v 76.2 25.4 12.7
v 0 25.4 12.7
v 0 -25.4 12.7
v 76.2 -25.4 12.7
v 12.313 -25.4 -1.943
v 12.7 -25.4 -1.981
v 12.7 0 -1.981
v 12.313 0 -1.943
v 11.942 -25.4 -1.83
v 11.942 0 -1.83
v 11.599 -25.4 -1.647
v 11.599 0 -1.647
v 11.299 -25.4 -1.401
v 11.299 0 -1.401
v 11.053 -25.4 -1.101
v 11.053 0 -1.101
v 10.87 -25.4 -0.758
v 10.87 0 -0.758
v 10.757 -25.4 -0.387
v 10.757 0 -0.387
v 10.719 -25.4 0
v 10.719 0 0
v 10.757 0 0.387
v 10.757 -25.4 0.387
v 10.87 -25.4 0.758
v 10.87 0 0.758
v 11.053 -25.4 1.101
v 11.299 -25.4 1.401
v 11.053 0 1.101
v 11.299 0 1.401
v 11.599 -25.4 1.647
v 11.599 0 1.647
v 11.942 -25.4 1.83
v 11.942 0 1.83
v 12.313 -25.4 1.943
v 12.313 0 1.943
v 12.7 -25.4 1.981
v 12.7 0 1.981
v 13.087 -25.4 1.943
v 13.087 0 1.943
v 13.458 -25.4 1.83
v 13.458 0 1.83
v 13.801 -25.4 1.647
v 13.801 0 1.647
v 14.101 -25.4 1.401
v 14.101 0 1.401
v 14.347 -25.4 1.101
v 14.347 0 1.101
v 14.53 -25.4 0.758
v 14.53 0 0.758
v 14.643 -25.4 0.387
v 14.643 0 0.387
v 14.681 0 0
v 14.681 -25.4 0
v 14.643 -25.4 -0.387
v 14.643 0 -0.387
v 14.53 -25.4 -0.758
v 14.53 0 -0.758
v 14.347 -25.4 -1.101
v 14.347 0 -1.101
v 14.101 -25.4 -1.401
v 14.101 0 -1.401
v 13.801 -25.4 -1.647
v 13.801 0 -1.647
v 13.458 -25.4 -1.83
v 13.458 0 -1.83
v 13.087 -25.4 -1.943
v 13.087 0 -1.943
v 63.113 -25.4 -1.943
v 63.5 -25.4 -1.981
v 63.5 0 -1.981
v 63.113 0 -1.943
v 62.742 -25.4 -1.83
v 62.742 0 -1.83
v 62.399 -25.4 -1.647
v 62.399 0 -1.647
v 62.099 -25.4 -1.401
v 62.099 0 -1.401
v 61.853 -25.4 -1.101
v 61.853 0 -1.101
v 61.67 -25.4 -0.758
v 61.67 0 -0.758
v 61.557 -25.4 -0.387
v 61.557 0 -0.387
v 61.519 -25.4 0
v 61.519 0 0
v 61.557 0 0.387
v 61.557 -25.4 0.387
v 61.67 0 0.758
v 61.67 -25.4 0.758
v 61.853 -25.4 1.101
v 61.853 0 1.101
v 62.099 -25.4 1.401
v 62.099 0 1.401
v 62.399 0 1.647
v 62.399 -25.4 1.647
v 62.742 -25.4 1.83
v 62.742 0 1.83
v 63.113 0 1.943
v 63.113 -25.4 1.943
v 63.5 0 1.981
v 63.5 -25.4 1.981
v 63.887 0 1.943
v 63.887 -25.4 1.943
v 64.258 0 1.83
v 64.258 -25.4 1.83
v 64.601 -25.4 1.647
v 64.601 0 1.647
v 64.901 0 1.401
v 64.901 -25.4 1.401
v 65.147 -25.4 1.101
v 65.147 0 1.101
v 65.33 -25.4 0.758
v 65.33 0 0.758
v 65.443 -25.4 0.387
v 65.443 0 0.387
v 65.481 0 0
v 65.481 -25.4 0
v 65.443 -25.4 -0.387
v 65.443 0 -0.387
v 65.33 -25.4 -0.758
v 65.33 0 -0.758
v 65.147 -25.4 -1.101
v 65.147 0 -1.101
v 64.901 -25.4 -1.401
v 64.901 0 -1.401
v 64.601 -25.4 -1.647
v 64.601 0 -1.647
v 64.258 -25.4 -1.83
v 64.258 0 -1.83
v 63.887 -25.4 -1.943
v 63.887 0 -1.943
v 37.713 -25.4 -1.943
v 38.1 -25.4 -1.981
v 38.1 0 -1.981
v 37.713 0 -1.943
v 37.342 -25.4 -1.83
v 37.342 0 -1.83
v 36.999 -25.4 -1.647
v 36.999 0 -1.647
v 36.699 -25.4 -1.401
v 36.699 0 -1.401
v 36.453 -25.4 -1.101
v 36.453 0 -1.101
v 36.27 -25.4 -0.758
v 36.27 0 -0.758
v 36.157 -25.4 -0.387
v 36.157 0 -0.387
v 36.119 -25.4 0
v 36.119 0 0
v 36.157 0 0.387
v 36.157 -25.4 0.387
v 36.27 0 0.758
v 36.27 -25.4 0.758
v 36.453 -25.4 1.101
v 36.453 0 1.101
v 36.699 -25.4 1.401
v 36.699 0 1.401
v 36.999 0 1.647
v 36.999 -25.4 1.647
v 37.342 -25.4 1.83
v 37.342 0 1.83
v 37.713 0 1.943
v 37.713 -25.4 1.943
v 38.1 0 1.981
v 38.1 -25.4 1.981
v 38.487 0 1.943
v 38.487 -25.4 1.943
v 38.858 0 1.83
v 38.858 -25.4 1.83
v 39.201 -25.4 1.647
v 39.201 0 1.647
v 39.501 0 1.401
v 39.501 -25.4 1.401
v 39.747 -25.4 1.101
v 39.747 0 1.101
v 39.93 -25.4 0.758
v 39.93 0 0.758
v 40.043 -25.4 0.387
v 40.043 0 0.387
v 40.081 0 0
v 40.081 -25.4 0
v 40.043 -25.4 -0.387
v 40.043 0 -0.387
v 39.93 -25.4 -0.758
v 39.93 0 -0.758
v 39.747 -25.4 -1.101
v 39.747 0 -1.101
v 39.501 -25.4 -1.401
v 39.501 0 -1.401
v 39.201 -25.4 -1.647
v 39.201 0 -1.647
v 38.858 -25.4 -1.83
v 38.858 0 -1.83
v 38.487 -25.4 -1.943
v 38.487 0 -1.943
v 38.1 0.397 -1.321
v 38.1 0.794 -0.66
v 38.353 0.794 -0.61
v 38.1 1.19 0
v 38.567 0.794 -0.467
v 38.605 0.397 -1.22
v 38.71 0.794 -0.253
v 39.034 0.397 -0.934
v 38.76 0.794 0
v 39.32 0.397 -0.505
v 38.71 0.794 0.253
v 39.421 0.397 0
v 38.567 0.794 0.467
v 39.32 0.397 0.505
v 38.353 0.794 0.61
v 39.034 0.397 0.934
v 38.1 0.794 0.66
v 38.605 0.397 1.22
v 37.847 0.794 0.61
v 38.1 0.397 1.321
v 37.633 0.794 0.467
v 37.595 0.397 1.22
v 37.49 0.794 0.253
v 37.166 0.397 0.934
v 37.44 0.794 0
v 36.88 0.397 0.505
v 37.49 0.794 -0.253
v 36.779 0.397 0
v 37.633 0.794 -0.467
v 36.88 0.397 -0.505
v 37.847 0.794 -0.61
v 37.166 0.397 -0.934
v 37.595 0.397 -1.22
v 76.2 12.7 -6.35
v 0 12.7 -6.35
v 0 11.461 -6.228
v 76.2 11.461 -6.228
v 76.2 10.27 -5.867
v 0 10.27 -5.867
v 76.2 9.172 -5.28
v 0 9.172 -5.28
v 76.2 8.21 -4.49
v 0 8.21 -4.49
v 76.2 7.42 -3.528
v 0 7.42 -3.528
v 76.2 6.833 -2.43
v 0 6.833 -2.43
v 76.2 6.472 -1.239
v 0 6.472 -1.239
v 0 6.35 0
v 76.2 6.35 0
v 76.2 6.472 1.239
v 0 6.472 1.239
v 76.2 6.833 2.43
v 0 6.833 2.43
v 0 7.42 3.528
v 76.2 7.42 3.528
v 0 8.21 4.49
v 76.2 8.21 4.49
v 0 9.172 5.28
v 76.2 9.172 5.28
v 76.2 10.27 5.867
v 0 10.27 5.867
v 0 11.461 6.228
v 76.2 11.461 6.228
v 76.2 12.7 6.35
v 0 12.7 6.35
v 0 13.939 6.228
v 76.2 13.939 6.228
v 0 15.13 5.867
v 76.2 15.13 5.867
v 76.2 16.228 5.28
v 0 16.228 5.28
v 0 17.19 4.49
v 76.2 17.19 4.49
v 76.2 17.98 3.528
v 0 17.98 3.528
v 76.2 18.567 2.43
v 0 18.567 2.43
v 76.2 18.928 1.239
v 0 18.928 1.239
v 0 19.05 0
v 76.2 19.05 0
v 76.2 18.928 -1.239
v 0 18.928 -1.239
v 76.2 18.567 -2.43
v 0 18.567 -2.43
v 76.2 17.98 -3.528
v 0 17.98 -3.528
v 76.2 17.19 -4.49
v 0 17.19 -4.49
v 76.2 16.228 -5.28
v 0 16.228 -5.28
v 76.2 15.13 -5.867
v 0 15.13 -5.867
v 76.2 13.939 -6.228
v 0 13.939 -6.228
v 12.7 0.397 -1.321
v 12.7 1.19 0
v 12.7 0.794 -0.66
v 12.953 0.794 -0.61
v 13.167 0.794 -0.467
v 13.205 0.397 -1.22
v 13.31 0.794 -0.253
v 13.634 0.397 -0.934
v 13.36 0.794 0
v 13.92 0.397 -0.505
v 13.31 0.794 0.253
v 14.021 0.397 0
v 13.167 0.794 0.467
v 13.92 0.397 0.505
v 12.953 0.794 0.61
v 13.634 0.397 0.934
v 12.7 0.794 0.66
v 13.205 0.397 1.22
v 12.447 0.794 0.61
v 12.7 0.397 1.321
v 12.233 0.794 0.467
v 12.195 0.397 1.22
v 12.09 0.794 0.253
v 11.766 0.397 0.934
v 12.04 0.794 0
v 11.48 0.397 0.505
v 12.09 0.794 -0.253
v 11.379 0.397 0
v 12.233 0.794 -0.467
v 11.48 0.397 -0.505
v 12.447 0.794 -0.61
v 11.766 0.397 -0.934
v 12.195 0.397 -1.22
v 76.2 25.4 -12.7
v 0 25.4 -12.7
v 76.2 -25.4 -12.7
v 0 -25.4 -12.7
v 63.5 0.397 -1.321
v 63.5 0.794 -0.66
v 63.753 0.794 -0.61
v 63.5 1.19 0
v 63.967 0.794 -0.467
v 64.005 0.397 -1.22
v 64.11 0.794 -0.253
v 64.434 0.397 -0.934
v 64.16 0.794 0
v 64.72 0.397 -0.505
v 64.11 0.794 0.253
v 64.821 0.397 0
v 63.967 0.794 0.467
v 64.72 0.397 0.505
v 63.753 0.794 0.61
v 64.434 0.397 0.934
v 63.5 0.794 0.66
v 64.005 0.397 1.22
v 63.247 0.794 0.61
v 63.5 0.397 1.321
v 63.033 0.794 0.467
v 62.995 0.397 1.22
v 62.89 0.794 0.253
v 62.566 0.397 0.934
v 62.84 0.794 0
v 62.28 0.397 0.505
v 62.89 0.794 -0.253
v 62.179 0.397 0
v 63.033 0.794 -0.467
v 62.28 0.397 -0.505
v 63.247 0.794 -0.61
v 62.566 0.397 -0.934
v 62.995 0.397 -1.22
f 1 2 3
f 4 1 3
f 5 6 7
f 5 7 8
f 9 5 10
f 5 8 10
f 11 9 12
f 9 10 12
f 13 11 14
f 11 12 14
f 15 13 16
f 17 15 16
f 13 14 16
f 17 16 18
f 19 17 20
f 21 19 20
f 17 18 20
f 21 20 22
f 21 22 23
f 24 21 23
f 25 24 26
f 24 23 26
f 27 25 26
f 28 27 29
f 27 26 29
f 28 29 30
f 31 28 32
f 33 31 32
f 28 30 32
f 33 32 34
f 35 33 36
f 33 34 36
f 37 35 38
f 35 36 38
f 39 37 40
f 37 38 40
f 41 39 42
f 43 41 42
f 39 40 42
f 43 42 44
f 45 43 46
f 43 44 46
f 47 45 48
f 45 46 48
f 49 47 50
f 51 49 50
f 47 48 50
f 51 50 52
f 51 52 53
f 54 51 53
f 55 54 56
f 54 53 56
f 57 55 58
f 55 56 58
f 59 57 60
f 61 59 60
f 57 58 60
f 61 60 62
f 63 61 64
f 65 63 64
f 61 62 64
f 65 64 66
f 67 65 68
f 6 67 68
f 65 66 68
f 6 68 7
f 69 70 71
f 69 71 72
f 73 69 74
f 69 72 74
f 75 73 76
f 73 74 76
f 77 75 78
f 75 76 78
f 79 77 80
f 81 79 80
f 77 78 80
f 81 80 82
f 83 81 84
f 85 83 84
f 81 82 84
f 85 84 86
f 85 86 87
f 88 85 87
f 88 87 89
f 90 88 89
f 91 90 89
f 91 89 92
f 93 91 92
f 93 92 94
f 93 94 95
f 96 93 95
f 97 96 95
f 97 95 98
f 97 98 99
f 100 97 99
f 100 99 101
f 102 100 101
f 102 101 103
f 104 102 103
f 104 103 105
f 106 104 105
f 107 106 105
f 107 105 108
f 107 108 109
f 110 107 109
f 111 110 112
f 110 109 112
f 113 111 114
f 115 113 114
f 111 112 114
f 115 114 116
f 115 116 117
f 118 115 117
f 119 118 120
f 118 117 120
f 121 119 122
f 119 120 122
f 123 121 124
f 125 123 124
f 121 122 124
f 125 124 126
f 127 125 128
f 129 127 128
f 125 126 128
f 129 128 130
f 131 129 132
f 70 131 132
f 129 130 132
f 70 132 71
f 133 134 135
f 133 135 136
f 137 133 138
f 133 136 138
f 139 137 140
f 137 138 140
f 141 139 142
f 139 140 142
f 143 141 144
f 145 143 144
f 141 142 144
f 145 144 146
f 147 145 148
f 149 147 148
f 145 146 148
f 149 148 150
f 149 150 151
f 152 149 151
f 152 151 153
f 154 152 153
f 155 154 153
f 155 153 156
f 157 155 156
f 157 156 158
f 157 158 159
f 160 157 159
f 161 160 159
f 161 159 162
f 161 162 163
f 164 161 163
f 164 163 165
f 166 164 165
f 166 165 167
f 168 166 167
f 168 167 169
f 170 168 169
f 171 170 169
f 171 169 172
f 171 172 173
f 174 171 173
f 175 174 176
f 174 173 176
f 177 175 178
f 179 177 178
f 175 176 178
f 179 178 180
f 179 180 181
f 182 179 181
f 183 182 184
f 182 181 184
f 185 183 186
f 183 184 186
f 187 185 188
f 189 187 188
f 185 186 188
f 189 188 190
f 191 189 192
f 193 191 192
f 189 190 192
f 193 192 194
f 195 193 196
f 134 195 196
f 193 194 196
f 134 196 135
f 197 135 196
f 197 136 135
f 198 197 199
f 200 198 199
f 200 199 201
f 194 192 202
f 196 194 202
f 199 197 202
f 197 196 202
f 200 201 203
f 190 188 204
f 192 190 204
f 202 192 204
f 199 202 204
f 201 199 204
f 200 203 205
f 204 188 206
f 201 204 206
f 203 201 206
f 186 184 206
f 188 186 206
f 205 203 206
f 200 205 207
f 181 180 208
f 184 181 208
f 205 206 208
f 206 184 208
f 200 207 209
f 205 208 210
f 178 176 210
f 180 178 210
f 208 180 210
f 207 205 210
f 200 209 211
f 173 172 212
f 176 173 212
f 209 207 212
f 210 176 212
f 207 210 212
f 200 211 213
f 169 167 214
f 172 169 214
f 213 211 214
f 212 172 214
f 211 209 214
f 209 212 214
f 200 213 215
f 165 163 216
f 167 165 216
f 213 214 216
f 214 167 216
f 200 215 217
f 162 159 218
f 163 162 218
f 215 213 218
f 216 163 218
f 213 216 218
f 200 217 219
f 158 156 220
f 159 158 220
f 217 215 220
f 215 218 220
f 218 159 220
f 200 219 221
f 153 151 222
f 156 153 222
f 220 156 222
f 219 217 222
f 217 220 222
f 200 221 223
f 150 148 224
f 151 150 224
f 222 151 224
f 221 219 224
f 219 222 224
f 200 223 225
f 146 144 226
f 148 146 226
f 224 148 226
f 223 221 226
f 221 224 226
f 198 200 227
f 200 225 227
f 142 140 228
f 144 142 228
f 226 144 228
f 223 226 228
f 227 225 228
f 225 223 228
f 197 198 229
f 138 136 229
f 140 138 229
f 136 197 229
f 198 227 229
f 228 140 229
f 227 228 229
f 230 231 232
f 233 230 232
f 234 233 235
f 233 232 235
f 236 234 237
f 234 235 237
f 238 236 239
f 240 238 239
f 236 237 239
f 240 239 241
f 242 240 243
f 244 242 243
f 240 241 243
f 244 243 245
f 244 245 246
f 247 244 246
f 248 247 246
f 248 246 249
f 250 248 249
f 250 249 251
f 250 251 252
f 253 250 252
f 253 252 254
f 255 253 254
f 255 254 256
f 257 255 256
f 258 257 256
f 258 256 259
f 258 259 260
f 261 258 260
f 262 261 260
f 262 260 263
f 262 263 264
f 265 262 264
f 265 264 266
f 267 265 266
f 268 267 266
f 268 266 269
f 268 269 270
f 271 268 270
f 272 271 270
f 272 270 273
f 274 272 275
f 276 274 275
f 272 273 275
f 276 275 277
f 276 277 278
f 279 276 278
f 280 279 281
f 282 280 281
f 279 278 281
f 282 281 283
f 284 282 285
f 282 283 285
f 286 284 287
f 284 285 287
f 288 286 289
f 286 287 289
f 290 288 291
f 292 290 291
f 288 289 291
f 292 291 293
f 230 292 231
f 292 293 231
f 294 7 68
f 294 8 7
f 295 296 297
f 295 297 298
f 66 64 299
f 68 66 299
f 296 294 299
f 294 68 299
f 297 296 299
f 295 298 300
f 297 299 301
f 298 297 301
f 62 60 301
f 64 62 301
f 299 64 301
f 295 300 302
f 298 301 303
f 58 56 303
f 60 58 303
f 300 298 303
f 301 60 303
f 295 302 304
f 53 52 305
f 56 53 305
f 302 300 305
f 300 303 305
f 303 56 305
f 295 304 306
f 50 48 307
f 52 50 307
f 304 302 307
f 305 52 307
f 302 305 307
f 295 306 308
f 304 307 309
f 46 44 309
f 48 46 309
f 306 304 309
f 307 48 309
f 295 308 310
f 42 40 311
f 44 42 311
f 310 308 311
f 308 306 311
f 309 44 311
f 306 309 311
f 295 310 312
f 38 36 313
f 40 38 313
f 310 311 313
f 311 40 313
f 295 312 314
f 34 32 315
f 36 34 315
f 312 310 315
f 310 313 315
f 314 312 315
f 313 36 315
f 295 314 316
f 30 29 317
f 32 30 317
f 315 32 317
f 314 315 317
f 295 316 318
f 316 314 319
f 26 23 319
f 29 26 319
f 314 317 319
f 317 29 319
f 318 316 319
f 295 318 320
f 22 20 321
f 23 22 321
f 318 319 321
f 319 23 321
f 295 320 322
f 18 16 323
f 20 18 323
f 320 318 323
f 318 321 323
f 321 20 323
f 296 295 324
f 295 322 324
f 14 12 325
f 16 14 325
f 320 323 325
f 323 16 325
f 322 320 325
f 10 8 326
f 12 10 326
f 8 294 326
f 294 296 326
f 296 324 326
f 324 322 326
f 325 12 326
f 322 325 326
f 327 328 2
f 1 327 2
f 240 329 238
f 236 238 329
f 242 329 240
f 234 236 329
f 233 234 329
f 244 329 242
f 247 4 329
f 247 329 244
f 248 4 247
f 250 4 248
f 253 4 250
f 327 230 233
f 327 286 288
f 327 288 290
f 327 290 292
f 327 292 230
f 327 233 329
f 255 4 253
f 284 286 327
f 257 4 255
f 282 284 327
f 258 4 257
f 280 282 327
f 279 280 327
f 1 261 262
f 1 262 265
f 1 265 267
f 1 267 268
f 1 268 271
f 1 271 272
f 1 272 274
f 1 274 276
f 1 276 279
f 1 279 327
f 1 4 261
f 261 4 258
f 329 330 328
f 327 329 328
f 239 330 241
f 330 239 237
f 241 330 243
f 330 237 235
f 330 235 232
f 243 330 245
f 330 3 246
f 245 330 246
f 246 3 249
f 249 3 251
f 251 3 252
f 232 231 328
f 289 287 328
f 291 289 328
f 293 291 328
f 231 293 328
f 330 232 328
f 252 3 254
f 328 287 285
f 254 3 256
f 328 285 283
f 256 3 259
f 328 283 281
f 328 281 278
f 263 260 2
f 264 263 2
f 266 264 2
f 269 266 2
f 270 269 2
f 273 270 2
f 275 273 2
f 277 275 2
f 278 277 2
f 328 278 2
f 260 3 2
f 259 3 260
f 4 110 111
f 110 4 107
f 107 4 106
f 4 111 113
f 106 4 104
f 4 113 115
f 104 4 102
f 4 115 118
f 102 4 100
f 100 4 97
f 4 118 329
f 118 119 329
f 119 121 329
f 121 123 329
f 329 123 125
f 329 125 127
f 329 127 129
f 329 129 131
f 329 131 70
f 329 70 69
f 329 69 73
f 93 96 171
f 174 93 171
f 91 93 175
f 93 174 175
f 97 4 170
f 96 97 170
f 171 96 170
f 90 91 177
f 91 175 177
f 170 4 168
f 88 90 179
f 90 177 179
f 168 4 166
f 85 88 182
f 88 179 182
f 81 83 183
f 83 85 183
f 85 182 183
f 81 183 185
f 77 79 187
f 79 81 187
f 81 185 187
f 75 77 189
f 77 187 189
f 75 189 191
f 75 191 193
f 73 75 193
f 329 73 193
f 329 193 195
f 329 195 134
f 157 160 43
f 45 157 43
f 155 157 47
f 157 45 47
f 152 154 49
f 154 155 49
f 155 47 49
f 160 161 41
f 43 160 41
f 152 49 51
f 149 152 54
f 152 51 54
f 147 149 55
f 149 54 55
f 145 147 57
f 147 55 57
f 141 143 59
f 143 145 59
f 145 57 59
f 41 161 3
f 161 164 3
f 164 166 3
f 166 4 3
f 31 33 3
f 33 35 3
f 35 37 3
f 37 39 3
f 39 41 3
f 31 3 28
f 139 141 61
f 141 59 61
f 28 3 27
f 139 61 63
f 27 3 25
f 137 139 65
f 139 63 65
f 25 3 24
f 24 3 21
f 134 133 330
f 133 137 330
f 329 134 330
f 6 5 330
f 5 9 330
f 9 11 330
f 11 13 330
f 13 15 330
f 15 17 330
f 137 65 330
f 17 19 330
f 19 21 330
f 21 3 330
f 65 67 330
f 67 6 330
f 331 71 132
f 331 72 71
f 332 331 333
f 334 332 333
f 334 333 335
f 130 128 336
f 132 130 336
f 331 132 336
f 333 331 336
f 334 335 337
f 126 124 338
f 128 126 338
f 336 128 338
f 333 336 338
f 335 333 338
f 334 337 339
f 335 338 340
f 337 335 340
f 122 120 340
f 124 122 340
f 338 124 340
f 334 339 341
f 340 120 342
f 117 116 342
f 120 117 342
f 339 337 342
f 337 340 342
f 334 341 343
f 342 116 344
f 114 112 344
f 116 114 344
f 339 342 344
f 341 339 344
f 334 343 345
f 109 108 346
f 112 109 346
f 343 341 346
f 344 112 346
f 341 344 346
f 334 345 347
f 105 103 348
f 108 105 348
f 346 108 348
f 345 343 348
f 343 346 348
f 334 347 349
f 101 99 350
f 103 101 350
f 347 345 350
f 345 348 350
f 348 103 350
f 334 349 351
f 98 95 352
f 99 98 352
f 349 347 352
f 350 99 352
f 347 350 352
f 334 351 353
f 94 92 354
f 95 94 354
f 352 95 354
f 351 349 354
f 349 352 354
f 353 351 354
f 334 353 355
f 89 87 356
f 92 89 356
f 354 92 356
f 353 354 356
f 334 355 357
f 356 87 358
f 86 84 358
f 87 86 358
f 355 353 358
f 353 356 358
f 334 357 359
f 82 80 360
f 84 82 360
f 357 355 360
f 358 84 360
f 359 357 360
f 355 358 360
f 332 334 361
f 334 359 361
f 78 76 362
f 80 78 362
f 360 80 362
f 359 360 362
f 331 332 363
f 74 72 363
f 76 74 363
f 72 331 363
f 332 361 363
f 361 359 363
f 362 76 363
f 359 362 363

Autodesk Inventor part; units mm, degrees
ref_plane "YZ Plane" through (0, 0, 0) normal (1, 0, 0) x (0, 1, 0)
ref_plane "XZ Plane" through (0, 0, 0) normal (0, 1, 0) x (-1, 0, 0)
ref_plane "XY Plane" through (0, 0, 0) normal (0, 0, 1) x (1, 0, 0)
sketch "Sketch1" plane through (0, 0, 0) normal (1, 0, 0) x (0, 1, 0)
  line L0 (25.4, 12.7) -> (-25.4, 12.7)
  line L1 (-25.4, 12.7) -> (-25.4, -12.7)
  line L2 (-25.4, -12.7) -> (25.4, -12.7)
  line L3 (25.4, -12.7) -> (25.4, 12.7)
  line L4 (25.4, 12.7) -> (-25.4, -12.7) construction
  line L5 (-25.4, 12.7) -> (25.4, -12.7) construction
  point P0 (0, 0)
  dimension "d0" = 50.8
  dimension "d1" = 25.4
extrude "Extrusion1" add sketch "Sketch1" along normal blind 76.2
sketch "Sketch2" plane through (76.2, 0, 0) normal (1, 0, 0) x (0, 0, -1)
  line L0 (12.7, 25.4) -> (-12.7, 25.4) construction
  point P0 (0, 0)
  point P1 (0, 12.7)
  dimension "d4" = 12.7
hole "Hole1" at (76.2, 12.7, 0) direction (-1, 0, 0) diameter 12.7 end through all
sketch "Sketch3" plane through (0, -25.4, -12.7) normal (0, -1, 0) x (1, 0, 0)
  line L0 (0, 0) -> (76.2, 0) construction
  line L1 (63.5, 12.7) -> (12.7, 12.7) construction
  line L2 (76.2, 25.4) -> (76.2, 0) construction
  point P0 (0, 12.7)
  point P1 (38.1, 12.7)
  point P2 (38.1, 0)
  point P3 (38.1, 12.7)
  point P4 (76.2, 12.7)
  dimension "d12" = 50.8
hole "Hole2" at (63.5, -25.4, 0) at (38.1, -25.4, 0) at (12.7, -25.4, 0) direction (0, 1, 0) diameter 3.9624 depth 25.4 tip angle 118 thread size "10-32 UNF" class "2B" standard "ANSI Unified Screw Threads"
properties part number "CHD-001" material "Aluminum 6061"
